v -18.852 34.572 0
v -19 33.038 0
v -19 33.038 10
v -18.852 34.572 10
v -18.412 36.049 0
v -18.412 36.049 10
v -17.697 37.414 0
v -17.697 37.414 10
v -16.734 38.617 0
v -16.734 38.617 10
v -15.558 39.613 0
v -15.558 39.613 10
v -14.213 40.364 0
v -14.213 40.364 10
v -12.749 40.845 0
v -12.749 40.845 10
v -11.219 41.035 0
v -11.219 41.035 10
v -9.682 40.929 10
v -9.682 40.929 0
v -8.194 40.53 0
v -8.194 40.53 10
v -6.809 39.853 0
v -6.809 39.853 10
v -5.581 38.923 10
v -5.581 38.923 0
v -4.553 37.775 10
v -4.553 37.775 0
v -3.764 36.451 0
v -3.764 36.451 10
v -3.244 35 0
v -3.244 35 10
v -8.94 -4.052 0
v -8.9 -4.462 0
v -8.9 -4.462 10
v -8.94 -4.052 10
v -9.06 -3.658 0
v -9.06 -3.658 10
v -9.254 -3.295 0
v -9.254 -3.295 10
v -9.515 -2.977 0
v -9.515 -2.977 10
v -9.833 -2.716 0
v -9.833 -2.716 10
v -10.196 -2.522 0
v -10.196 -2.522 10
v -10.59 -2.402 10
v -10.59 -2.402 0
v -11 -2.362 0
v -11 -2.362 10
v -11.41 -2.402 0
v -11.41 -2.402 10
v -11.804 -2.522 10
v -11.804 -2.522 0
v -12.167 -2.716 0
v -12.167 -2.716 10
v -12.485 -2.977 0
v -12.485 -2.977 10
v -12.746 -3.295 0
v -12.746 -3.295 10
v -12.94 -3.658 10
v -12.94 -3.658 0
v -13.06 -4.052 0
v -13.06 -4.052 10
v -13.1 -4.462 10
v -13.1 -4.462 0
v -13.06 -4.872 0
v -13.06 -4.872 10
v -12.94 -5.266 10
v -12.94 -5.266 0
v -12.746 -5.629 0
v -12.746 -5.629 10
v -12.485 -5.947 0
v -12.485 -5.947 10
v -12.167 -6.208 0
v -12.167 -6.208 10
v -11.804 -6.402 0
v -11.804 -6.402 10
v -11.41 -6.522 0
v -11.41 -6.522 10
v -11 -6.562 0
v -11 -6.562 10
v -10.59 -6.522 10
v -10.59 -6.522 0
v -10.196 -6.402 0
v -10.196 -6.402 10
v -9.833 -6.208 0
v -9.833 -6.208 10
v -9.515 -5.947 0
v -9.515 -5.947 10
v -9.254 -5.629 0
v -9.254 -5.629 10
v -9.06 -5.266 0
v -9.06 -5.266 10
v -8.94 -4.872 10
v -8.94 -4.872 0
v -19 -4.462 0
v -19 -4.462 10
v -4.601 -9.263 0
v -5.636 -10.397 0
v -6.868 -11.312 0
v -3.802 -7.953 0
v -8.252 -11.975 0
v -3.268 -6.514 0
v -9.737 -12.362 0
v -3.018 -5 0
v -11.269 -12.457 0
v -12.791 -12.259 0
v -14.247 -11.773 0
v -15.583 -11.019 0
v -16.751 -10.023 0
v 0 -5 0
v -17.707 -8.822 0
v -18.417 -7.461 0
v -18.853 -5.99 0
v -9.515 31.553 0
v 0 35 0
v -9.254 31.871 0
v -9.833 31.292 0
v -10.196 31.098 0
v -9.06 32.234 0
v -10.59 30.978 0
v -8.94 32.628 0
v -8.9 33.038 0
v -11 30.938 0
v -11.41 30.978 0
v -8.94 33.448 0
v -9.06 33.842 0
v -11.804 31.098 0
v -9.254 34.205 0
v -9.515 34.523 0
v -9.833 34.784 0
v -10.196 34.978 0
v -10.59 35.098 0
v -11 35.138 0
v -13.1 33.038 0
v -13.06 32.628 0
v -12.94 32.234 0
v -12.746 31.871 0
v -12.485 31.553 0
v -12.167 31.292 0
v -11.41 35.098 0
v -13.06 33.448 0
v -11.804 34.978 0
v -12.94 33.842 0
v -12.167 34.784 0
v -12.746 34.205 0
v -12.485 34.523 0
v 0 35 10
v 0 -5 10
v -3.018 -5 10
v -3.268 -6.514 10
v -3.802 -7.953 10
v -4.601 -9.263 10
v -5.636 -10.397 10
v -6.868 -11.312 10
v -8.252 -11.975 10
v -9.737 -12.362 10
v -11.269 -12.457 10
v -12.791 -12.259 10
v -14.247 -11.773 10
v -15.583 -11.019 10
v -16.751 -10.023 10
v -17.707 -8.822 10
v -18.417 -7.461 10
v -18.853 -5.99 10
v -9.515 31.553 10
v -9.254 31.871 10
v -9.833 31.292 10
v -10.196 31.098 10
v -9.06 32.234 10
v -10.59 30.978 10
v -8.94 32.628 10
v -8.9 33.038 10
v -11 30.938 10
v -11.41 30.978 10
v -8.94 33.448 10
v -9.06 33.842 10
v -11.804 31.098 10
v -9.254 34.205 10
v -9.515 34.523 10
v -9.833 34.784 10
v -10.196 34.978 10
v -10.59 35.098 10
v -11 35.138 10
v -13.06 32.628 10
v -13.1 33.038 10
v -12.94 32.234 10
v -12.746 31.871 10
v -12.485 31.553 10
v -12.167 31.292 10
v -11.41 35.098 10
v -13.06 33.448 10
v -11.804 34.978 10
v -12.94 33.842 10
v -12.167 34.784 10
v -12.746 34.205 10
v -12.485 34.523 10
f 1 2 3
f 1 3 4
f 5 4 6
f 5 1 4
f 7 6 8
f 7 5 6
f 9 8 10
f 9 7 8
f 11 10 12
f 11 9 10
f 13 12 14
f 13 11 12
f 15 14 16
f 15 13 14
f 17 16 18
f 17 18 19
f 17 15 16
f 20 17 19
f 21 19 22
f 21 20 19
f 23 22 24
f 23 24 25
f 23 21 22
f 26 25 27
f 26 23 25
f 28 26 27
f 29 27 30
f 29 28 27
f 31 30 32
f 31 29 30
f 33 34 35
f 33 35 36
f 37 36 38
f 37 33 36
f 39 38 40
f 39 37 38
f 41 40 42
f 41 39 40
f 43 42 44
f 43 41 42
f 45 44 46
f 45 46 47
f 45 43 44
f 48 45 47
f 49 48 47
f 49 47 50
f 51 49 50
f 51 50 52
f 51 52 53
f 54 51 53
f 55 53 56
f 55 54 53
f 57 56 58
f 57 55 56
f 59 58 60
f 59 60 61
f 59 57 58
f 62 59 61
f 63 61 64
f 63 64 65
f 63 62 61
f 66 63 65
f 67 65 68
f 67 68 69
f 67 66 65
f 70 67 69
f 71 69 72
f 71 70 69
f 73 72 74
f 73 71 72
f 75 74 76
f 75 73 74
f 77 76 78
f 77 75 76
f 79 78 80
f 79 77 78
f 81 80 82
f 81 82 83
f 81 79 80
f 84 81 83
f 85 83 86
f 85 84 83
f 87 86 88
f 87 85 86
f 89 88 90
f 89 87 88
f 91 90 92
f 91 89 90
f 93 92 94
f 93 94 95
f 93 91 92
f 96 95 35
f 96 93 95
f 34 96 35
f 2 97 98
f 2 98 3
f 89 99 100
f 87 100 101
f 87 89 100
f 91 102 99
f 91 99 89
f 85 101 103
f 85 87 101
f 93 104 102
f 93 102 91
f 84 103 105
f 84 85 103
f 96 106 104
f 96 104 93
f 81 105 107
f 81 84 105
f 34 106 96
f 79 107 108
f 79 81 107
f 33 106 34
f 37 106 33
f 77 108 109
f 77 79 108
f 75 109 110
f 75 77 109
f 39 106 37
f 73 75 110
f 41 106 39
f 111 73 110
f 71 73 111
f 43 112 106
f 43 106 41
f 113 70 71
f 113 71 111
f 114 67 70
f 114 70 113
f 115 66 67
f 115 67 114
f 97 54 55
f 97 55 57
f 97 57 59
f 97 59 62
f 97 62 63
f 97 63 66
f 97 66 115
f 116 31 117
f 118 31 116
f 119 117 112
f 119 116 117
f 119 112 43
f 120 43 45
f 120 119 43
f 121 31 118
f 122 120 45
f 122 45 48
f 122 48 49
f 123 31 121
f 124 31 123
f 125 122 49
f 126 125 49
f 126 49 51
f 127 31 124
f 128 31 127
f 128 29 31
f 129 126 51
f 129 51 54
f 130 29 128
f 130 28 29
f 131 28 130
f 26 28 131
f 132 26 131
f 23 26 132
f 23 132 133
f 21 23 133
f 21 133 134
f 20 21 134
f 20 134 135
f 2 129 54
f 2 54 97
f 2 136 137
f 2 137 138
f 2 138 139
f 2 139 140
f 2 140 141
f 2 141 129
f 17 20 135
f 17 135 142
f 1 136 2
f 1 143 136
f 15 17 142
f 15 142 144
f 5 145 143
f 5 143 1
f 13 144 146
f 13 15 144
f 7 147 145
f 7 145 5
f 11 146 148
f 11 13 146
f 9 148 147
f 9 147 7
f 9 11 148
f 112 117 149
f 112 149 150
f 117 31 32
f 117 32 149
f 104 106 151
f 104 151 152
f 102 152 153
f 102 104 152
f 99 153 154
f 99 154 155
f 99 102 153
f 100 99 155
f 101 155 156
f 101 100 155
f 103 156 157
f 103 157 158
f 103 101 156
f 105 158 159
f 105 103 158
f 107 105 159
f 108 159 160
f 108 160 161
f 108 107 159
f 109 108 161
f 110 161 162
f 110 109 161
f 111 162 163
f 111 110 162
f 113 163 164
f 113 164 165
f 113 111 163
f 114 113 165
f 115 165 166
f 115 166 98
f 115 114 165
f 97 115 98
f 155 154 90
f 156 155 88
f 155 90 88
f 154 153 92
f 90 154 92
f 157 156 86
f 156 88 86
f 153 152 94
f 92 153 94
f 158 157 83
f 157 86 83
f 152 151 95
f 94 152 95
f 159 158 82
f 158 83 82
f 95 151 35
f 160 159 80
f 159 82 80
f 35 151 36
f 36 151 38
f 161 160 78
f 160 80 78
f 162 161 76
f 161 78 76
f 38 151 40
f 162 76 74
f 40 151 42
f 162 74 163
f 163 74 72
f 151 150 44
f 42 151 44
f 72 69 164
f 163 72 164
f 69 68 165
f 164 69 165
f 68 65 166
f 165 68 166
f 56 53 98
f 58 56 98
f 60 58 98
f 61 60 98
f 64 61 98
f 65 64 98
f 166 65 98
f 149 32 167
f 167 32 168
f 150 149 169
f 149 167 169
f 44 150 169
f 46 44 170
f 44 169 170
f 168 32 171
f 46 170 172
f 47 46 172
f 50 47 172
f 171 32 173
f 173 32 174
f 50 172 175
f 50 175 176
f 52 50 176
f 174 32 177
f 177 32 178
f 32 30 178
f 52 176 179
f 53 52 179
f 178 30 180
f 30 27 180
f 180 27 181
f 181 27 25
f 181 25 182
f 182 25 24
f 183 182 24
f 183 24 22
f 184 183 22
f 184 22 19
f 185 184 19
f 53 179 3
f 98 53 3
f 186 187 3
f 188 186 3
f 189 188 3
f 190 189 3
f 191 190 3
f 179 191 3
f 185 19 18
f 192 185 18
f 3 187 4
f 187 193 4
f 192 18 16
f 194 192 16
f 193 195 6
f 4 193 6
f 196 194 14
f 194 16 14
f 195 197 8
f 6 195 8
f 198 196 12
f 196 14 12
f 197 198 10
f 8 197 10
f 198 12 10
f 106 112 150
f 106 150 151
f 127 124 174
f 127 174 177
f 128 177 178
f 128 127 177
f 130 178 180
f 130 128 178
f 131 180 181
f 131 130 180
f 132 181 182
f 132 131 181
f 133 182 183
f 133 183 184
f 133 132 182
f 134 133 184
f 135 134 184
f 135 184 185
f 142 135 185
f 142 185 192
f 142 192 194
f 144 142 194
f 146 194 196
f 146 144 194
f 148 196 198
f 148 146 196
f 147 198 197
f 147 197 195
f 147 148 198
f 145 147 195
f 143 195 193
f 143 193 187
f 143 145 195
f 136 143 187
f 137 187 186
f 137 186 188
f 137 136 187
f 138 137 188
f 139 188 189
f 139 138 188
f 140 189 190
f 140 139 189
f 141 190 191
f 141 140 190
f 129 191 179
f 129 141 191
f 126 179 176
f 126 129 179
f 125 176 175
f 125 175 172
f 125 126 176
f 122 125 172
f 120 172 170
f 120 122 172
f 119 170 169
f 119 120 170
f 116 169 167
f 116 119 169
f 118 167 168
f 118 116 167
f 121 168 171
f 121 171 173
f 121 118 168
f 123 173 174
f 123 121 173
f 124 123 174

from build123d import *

# Parameters (mm, degrees)
CROQUIS1_R              = 2.1
SALIENTE_EXTRUIR1_DEPTH = 10


with BuildPart() as part:
    # Croquis1 → Saliente-Extruir1 (new body)
    with BuildSketch(Plane.XY):
        with BuildLine():
            Line((-3.244321048, 35), (0, 35))
            Line((0, 35), (0, -5))
            Line((0, -5), (-3.01811075, -5))
            ThreePointArc((-3.01811075, -5), (-11.269152373, -12.457471031), (-19, -4.462))
            Line((-19, -4.462), (-19, 33.038))
            ThreePointArc((-19, 33.038), (-11.988576853, 40.976684766), (-3.244321048, 35))
        make_face()
        with Locations((-11, -4.462)):
            Circle(CROQUIS1_R, mode=Mode.SUBTRACT)
        with Locations((-11, 33.038)):
            Circle(CROQUIS1_R, mode=Mode.SUBTRACT)
    extrude(amount=SALIENTE_EXTRUIR1_DEPTH)


solid = part.part
